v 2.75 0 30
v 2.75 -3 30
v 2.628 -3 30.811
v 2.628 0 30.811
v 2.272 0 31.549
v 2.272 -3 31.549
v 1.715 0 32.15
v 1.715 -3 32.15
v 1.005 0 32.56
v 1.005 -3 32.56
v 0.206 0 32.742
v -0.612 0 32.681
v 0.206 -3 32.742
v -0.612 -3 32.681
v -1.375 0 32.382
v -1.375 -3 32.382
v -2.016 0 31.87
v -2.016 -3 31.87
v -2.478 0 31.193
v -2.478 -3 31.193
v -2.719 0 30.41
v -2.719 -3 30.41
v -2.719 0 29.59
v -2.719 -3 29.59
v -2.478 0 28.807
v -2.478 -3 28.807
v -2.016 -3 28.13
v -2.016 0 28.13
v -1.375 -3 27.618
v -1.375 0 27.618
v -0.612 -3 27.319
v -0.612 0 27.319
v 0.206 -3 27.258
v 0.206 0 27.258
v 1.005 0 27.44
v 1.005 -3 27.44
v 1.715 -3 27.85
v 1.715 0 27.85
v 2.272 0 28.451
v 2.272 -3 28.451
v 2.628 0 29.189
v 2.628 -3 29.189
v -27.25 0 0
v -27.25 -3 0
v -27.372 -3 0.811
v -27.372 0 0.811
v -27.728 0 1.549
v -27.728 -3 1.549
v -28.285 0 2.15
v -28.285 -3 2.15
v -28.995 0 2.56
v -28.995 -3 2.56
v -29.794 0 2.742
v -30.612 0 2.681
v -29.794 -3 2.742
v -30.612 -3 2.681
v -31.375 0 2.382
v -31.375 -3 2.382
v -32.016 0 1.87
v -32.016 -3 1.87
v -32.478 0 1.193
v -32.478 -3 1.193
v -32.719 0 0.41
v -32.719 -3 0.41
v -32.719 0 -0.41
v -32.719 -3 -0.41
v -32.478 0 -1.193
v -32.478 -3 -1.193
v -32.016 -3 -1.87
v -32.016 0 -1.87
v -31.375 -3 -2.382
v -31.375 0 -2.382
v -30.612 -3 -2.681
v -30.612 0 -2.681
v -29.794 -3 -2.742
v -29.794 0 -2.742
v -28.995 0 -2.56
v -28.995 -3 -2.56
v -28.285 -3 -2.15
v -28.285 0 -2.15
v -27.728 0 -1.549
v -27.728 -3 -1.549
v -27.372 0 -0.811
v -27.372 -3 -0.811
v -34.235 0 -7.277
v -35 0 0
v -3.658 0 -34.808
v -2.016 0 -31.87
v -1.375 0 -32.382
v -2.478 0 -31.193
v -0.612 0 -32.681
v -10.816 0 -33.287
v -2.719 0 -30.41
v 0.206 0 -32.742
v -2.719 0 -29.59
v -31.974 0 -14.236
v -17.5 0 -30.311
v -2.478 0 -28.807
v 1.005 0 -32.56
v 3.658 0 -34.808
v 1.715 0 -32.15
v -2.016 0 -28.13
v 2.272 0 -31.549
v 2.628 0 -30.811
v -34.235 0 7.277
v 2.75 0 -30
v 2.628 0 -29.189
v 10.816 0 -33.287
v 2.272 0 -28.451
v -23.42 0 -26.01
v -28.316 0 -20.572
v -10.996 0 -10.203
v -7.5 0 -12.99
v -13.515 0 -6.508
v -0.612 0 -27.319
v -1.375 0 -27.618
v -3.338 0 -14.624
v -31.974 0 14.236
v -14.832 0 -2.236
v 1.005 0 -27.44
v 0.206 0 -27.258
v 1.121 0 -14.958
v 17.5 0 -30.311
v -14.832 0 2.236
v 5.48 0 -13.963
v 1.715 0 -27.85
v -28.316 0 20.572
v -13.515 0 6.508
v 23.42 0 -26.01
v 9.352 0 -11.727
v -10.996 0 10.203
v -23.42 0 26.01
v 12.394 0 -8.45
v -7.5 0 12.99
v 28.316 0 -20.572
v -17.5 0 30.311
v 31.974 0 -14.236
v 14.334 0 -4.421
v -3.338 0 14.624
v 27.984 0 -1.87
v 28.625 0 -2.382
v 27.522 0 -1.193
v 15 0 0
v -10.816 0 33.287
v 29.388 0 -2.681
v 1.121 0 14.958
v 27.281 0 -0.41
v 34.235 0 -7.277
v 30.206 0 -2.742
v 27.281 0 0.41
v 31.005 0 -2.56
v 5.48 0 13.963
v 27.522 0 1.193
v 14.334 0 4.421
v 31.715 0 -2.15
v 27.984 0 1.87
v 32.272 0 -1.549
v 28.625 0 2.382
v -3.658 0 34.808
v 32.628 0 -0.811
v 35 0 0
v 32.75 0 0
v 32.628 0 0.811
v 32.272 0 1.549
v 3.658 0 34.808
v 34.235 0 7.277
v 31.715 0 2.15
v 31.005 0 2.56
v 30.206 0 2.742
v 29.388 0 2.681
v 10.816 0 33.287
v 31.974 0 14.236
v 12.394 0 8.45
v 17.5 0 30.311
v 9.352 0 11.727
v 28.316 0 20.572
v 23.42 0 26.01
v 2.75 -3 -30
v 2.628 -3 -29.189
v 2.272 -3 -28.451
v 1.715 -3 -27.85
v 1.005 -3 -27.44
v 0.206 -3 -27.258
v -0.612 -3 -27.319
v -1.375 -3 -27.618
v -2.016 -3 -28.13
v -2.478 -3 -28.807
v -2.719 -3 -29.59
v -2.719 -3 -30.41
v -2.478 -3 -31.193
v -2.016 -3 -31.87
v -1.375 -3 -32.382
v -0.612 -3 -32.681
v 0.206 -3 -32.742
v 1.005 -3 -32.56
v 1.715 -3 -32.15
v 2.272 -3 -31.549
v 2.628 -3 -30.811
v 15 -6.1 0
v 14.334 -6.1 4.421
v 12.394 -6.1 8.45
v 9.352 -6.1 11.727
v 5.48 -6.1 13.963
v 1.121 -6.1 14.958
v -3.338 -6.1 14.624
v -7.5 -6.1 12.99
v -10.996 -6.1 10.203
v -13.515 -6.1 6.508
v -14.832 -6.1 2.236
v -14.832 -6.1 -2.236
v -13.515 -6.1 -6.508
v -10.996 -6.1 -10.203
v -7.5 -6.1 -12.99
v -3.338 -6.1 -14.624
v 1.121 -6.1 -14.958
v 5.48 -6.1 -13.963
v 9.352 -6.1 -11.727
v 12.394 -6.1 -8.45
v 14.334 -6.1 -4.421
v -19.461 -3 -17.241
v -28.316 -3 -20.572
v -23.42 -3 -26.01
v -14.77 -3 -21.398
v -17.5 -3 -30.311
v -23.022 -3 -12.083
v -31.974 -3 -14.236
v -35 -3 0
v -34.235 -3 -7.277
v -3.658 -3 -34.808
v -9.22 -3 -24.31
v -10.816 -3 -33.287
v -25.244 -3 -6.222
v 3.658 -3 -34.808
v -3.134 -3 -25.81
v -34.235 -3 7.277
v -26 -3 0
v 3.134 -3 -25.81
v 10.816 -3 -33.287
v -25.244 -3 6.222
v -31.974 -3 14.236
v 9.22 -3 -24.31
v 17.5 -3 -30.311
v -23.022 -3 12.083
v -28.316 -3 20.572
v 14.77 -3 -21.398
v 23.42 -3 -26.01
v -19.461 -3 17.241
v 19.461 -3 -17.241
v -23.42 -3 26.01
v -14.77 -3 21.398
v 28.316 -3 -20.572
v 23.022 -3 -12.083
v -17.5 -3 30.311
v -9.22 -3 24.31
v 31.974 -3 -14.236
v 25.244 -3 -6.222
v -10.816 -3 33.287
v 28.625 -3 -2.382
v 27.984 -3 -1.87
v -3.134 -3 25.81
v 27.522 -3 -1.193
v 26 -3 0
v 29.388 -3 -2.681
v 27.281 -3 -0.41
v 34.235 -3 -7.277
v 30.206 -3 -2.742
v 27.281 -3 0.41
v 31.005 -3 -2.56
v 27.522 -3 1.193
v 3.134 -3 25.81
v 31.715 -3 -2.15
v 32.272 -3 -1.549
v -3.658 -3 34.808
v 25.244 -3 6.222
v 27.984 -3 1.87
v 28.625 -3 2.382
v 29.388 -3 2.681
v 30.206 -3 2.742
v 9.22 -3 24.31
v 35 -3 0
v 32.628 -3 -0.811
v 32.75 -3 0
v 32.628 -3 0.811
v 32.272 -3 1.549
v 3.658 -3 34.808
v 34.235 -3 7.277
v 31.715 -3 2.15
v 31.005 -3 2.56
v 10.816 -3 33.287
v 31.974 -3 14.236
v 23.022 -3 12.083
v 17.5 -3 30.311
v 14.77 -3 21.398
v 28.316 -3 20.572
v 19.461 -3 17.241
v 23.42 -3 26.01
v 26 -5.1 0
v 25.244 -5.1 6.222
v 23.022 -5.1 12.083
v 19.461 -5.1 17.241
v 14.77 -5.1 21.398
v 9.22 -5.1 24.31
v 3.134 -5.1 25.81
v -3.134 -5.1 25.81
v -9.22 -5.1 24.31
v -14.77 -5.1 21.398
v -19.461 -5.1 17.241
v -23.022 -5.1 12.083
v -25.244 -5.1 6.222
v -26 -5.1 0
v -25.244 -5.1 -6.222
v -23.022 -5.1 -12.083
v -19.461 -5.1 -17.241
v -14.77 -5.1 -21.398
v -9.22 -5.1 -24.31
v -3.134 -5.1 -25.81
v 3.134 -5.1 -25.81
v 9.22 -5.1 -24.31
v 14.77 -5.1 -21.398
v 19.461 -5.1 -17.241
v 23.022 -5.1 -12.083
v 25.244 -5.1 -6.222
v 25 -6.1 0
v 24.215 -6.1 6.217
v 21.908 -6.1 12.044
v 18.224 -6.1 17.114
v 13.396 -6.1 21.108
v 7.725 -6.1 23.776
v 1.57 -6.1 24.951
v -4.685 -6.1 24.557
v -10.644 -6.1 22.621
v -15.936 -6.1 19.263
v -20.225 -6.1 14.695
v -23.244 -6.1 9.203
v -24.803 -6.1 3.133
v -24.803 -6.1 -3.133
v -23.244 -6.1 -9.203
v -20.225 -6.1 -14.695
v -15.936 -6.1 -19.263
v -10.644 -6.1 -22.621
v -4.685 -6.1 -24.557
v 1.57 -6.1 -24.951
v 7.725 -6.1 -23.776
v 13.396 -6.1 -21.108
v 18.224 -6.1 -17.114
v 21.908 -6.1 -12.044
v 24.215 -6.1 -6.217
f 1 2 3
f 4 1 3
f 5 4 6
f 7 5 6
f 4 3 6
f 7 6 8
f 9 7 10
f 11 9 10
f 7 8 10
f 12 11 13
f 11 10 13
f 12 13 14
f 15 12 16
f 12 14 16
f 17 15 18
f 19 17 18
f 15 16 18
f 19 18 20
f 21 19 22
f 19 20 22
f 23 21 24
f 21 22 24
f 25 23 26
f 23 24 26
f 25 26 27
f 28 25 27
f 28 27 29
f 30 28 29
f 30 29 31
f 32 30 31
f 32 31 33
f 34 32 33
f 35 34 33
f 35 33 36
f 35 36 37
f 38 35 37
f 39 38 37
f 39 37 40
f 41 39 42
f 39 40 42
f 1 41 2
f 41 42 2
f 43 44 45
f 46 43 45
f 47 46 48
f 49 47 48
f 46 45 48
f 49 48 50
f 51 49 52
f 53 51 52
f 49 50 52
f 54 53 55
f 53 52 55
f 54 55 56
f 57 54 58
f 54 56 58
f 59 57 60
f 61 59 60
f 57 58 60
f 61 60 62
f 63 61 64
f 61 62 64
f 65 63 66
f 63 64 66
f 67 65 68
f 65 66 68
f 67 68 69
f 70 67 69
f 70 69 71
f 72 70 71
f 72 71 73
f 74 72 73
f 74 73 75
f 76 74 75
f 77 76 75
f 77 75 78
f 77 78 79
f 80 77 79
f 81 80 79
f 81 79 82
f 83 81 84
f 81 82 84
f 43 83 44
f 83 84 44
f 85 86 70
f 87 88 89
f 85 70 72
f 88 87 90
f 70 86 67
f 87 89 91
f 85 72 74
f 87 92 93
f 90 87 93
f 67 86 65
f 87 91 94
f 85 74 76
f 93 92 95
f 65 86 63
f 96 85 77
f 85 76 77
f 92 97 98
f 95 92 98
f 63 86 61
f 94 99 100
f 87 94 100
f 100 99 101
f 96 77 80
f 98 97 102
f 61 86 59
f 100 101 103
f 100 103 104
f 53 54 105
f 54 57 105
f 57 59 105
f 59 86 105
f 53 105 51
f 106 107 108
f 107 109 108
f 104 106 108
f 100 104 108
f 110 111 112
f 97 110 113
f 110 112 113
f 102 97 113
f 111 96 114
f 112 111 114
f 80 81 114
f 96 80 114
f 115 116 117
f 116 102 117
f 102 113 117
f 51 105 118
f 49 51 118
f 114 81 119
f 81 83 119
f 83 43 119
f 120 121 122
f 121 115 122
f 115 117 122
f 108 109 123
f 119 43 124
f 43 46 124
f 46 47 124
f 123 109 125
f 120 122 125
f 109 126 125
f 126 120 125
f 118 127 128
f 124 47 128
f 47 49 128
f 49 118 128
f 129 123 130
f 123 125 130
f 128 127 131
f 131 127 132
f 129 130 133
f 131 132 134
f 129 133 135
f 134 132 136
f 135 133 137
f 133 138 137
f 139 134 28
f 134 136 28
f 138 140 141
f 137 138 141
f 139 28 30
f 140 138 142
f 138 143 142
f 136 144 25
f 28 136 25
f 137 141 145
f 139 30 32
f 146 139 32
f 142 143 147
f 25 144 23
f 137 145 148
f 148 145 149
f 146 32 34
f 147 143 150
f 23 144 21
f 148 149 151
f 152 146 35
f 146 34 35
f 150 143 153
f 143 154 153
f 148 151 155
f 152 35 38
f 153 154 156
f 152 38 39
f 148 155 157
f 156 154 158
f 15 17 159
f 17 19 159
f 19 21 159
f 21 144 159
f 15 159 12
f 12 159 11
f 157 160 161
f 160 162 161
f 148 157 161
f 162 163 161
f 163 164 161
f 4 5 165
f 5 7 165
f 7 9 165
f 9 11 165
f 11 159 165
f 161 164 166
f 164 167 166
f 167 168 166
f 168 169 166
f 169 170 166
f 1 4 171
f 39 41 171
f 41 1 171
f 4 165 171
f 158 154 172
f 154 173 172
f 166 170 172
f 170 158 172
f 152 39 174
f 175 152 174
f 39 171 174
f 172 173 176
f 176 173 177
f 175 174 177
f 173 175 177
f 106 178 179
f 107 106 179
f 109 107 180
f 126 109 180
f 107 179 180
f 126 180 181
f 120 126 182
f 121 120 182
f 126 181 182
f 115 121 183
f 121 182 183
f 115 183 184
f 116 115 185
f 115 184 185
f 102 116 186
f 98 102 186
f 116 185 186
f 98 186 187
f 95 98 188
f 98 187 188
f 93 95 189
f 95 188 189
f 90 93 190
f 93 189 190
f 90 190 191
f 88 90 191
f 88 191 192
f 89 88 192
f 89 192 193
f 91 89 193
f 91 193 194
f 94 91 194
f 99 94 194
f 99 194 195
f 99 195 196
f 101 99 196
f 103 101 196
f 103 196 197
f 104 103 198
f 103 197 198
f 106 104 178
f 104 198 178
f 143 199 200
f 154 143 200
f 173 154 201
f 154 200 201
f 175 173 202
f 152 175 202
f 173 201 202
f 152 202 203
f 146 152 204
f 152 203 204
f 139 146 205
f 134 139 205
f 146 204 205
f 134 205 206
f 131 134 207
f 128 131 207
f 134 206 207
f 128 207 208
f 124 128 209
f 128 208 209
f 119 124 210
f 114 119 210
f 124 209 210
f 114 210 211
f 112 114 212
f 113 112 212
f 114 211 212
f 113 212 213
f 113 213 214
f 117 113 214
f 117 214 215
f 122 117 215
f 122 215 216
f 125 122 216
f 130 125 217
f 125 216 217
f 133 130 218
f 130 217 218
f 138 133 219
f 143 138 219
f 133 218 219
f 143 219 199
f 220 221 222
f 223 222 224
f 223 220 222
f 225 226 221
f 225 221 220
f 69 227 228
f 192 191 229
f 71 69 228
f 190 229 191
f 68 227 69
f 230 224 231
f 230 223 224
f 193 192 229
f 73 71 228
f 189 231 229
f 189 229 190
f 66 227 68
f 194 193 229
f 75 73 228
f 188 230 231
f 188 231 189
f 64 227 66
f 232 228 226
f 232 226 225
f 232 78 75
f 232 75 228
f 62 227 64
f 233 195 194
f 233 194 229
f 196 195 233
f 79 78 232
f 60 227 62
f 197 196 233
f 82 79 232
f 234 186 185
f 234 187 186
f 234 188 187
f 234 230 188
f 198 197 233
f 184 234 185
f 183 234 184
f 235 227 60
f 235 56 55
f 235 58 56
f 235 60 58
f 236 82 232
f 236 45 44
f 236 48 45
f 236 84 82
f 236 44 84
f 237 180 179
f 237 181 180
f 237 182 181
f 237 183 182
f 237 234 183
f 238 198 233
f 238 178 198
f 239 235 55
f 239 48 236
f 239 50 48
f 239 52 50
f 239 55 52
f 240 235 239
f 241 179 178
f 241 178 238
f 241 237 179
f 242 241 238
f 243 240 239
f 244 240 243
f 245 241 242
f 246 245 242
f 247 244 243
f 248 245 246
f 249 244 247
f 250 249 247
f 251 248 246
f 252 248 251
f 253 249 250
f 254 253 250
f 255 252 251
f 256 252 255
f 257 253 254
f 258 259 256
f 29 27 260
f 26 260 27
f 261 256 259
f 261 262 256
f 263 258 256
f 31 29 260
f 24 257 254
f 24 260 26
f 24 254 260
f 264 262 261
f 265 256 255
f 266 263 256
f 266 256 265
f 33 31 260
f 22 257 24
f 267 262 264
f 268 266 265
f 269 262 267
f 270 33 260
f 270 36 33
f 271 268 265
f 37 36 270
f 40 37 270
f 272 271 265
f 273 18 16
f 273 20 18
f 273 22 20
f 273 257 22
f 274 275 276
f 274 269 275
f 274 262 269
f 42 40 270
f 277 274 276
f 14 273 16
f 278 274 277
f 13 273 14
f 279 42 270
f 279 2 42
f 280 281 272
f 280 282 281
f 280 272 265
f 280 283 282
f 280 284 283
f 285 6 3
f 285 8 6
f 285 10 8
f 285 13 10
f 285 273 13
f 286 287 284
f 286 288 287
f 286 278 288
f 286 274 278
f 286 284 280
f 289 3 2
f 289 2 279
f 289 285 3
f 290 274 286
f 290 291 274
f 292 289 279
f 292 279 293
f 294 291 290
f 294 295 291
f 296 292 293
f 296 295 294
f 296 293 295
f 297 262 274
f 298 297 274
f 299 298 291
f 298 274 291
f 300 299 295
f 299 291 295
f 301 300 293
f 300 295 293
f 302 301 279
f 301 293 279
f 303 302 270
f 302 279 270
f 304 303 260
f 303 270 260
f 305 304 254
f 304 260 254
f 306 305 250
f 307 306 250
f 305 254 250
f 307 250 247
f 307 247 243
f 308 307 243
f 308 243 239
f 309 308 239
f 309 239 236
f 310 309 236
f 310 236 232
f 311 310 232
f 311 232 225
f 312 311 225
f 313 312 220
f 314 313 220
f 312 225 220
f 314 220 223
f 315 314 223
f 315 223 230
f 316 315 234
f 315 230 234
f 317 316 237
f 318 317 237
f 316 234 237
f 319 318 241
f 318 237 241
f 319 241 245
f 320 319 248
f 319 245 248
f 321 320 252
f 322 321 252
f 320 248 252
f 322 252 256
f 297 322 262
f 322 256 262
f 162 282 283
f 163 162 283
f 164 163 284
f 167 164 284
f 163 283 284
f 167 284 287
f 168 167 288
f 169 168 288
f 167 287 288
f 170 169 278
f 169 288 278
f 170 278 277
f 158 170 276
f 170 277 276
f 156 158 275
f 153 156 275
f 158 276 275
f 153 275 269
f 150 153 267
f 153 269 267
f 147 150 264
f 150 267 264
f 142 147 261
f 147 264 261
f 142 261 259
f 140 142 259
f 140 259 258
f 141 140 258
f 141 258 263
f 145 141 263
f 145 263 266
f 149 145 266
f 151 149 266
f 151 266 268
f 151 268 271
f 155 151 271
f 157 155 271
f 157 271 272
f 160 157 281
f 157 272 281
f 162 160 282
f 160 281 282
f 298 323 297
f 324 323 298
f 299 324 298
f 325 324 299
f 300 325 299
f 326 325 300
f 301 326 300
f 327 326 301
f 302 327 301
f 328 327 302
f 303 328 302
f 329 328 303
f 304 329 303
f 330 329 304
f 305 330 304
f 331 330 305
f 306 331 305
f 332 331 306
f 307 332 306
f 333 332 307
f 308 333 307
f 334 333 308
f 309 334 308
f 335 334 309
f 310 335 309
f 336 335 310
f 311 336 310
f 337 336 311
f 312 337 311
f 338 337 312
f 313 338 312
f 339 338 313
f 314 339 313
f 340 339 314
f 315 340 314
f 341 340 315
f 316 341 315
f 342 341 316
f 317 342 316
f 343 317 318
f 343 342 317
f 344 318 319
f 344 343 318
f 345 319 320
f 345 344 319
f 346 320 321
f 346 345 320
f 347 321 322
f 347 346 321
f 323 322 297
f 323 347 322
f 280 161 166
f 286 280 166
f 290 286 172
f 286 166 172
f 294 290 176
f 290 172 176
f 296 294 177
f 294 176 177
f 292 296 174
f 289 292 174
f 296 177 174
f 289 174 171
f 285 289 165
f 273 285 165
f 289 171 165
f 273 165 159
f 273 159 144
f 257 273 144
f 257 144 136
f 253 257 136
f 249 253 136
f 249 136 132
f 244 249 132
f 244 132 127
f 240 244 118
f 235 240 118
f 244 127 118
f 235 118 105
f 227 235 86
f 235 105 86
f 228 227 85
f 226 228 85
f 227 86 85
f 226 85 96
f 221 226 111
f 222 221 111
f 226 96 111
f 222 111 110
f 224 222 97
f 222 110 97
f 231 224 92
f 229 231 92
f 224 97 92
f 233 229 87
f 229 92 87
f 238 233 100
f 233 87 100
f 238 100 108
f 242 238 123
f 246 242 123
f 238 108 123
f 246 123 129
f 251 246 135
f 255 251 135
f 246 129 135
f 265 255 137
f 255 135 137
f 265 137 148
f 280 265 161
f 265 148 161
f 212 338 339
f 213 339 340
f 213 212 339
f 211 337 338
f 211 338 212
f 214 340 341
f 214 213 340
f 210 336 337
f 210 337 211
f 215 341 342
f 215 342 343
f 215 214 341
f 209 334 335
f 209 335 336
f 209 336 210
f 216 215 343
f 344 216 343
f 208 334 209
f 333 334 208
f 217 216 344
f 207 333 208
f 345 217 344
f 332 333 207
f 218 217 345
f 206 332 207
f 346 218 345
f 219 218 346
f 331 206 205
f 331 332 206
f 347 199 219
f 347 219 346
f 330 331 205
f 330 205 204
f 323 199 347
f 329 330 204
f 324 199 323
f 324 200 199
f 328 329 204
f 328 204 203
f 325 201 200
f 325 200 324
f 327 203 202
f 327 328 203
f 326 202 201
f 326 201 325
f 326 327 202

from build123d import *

# Parameters (mm, degrees)
F0_R     = 35
F1_DEPTH = 3
F2_R     = 2.75
F3_DEPTH = 3
F4_R     = 26
F5_DEPTH = 3.1
F6_R     = 15
F7_DEPTH = 6.1
F8_SIZE  = 1


with BuildPart() as f1:
    # F0 (on Front) → F1 (new body)
    with BuildSketch(Plane.XZ):
        Circle(F0_R)
    extrude(amount=F1_DEPTH)

    # F2 (on face) → F3 (cut, through all)
    with BuildSketch(Plane.XZ.offset(3)):
        with Locations((30, 0)):
            Circle(F2_R)
        with Locations((0, 30)):
            Circle(F2_R)
        with Locations((-30, 0)):
            Circle(F2_R)
        with Locations((0, -30)):
            Circle(F2_R)
    extrude(amount=-F3_DEPTH, mode=Mode.SUBTRACT)

    # F4 (on face) → F5 (join)
    with BuildSketch(Plane.XZ.offset(3)):
        Circle(F4_R)
    extrude(amount=F5_DEPTH)

    # F6 (on face) → F7 (cut, through all)
    with BuildSketch(Plane.XZ.offset(6.1)):
        Circle(F6_R)
    extrude(amount=-F7_DEPTH, mode=Mode.SUBTRACT)

    # F8
    f8_edges = [f1.edges().sort_by_distance(p)[0] for p in [
        (-26, -6.1, 0),
    ]]
    chamfer(f8_edges, length=F8_SIZE)


solid = f1.part
